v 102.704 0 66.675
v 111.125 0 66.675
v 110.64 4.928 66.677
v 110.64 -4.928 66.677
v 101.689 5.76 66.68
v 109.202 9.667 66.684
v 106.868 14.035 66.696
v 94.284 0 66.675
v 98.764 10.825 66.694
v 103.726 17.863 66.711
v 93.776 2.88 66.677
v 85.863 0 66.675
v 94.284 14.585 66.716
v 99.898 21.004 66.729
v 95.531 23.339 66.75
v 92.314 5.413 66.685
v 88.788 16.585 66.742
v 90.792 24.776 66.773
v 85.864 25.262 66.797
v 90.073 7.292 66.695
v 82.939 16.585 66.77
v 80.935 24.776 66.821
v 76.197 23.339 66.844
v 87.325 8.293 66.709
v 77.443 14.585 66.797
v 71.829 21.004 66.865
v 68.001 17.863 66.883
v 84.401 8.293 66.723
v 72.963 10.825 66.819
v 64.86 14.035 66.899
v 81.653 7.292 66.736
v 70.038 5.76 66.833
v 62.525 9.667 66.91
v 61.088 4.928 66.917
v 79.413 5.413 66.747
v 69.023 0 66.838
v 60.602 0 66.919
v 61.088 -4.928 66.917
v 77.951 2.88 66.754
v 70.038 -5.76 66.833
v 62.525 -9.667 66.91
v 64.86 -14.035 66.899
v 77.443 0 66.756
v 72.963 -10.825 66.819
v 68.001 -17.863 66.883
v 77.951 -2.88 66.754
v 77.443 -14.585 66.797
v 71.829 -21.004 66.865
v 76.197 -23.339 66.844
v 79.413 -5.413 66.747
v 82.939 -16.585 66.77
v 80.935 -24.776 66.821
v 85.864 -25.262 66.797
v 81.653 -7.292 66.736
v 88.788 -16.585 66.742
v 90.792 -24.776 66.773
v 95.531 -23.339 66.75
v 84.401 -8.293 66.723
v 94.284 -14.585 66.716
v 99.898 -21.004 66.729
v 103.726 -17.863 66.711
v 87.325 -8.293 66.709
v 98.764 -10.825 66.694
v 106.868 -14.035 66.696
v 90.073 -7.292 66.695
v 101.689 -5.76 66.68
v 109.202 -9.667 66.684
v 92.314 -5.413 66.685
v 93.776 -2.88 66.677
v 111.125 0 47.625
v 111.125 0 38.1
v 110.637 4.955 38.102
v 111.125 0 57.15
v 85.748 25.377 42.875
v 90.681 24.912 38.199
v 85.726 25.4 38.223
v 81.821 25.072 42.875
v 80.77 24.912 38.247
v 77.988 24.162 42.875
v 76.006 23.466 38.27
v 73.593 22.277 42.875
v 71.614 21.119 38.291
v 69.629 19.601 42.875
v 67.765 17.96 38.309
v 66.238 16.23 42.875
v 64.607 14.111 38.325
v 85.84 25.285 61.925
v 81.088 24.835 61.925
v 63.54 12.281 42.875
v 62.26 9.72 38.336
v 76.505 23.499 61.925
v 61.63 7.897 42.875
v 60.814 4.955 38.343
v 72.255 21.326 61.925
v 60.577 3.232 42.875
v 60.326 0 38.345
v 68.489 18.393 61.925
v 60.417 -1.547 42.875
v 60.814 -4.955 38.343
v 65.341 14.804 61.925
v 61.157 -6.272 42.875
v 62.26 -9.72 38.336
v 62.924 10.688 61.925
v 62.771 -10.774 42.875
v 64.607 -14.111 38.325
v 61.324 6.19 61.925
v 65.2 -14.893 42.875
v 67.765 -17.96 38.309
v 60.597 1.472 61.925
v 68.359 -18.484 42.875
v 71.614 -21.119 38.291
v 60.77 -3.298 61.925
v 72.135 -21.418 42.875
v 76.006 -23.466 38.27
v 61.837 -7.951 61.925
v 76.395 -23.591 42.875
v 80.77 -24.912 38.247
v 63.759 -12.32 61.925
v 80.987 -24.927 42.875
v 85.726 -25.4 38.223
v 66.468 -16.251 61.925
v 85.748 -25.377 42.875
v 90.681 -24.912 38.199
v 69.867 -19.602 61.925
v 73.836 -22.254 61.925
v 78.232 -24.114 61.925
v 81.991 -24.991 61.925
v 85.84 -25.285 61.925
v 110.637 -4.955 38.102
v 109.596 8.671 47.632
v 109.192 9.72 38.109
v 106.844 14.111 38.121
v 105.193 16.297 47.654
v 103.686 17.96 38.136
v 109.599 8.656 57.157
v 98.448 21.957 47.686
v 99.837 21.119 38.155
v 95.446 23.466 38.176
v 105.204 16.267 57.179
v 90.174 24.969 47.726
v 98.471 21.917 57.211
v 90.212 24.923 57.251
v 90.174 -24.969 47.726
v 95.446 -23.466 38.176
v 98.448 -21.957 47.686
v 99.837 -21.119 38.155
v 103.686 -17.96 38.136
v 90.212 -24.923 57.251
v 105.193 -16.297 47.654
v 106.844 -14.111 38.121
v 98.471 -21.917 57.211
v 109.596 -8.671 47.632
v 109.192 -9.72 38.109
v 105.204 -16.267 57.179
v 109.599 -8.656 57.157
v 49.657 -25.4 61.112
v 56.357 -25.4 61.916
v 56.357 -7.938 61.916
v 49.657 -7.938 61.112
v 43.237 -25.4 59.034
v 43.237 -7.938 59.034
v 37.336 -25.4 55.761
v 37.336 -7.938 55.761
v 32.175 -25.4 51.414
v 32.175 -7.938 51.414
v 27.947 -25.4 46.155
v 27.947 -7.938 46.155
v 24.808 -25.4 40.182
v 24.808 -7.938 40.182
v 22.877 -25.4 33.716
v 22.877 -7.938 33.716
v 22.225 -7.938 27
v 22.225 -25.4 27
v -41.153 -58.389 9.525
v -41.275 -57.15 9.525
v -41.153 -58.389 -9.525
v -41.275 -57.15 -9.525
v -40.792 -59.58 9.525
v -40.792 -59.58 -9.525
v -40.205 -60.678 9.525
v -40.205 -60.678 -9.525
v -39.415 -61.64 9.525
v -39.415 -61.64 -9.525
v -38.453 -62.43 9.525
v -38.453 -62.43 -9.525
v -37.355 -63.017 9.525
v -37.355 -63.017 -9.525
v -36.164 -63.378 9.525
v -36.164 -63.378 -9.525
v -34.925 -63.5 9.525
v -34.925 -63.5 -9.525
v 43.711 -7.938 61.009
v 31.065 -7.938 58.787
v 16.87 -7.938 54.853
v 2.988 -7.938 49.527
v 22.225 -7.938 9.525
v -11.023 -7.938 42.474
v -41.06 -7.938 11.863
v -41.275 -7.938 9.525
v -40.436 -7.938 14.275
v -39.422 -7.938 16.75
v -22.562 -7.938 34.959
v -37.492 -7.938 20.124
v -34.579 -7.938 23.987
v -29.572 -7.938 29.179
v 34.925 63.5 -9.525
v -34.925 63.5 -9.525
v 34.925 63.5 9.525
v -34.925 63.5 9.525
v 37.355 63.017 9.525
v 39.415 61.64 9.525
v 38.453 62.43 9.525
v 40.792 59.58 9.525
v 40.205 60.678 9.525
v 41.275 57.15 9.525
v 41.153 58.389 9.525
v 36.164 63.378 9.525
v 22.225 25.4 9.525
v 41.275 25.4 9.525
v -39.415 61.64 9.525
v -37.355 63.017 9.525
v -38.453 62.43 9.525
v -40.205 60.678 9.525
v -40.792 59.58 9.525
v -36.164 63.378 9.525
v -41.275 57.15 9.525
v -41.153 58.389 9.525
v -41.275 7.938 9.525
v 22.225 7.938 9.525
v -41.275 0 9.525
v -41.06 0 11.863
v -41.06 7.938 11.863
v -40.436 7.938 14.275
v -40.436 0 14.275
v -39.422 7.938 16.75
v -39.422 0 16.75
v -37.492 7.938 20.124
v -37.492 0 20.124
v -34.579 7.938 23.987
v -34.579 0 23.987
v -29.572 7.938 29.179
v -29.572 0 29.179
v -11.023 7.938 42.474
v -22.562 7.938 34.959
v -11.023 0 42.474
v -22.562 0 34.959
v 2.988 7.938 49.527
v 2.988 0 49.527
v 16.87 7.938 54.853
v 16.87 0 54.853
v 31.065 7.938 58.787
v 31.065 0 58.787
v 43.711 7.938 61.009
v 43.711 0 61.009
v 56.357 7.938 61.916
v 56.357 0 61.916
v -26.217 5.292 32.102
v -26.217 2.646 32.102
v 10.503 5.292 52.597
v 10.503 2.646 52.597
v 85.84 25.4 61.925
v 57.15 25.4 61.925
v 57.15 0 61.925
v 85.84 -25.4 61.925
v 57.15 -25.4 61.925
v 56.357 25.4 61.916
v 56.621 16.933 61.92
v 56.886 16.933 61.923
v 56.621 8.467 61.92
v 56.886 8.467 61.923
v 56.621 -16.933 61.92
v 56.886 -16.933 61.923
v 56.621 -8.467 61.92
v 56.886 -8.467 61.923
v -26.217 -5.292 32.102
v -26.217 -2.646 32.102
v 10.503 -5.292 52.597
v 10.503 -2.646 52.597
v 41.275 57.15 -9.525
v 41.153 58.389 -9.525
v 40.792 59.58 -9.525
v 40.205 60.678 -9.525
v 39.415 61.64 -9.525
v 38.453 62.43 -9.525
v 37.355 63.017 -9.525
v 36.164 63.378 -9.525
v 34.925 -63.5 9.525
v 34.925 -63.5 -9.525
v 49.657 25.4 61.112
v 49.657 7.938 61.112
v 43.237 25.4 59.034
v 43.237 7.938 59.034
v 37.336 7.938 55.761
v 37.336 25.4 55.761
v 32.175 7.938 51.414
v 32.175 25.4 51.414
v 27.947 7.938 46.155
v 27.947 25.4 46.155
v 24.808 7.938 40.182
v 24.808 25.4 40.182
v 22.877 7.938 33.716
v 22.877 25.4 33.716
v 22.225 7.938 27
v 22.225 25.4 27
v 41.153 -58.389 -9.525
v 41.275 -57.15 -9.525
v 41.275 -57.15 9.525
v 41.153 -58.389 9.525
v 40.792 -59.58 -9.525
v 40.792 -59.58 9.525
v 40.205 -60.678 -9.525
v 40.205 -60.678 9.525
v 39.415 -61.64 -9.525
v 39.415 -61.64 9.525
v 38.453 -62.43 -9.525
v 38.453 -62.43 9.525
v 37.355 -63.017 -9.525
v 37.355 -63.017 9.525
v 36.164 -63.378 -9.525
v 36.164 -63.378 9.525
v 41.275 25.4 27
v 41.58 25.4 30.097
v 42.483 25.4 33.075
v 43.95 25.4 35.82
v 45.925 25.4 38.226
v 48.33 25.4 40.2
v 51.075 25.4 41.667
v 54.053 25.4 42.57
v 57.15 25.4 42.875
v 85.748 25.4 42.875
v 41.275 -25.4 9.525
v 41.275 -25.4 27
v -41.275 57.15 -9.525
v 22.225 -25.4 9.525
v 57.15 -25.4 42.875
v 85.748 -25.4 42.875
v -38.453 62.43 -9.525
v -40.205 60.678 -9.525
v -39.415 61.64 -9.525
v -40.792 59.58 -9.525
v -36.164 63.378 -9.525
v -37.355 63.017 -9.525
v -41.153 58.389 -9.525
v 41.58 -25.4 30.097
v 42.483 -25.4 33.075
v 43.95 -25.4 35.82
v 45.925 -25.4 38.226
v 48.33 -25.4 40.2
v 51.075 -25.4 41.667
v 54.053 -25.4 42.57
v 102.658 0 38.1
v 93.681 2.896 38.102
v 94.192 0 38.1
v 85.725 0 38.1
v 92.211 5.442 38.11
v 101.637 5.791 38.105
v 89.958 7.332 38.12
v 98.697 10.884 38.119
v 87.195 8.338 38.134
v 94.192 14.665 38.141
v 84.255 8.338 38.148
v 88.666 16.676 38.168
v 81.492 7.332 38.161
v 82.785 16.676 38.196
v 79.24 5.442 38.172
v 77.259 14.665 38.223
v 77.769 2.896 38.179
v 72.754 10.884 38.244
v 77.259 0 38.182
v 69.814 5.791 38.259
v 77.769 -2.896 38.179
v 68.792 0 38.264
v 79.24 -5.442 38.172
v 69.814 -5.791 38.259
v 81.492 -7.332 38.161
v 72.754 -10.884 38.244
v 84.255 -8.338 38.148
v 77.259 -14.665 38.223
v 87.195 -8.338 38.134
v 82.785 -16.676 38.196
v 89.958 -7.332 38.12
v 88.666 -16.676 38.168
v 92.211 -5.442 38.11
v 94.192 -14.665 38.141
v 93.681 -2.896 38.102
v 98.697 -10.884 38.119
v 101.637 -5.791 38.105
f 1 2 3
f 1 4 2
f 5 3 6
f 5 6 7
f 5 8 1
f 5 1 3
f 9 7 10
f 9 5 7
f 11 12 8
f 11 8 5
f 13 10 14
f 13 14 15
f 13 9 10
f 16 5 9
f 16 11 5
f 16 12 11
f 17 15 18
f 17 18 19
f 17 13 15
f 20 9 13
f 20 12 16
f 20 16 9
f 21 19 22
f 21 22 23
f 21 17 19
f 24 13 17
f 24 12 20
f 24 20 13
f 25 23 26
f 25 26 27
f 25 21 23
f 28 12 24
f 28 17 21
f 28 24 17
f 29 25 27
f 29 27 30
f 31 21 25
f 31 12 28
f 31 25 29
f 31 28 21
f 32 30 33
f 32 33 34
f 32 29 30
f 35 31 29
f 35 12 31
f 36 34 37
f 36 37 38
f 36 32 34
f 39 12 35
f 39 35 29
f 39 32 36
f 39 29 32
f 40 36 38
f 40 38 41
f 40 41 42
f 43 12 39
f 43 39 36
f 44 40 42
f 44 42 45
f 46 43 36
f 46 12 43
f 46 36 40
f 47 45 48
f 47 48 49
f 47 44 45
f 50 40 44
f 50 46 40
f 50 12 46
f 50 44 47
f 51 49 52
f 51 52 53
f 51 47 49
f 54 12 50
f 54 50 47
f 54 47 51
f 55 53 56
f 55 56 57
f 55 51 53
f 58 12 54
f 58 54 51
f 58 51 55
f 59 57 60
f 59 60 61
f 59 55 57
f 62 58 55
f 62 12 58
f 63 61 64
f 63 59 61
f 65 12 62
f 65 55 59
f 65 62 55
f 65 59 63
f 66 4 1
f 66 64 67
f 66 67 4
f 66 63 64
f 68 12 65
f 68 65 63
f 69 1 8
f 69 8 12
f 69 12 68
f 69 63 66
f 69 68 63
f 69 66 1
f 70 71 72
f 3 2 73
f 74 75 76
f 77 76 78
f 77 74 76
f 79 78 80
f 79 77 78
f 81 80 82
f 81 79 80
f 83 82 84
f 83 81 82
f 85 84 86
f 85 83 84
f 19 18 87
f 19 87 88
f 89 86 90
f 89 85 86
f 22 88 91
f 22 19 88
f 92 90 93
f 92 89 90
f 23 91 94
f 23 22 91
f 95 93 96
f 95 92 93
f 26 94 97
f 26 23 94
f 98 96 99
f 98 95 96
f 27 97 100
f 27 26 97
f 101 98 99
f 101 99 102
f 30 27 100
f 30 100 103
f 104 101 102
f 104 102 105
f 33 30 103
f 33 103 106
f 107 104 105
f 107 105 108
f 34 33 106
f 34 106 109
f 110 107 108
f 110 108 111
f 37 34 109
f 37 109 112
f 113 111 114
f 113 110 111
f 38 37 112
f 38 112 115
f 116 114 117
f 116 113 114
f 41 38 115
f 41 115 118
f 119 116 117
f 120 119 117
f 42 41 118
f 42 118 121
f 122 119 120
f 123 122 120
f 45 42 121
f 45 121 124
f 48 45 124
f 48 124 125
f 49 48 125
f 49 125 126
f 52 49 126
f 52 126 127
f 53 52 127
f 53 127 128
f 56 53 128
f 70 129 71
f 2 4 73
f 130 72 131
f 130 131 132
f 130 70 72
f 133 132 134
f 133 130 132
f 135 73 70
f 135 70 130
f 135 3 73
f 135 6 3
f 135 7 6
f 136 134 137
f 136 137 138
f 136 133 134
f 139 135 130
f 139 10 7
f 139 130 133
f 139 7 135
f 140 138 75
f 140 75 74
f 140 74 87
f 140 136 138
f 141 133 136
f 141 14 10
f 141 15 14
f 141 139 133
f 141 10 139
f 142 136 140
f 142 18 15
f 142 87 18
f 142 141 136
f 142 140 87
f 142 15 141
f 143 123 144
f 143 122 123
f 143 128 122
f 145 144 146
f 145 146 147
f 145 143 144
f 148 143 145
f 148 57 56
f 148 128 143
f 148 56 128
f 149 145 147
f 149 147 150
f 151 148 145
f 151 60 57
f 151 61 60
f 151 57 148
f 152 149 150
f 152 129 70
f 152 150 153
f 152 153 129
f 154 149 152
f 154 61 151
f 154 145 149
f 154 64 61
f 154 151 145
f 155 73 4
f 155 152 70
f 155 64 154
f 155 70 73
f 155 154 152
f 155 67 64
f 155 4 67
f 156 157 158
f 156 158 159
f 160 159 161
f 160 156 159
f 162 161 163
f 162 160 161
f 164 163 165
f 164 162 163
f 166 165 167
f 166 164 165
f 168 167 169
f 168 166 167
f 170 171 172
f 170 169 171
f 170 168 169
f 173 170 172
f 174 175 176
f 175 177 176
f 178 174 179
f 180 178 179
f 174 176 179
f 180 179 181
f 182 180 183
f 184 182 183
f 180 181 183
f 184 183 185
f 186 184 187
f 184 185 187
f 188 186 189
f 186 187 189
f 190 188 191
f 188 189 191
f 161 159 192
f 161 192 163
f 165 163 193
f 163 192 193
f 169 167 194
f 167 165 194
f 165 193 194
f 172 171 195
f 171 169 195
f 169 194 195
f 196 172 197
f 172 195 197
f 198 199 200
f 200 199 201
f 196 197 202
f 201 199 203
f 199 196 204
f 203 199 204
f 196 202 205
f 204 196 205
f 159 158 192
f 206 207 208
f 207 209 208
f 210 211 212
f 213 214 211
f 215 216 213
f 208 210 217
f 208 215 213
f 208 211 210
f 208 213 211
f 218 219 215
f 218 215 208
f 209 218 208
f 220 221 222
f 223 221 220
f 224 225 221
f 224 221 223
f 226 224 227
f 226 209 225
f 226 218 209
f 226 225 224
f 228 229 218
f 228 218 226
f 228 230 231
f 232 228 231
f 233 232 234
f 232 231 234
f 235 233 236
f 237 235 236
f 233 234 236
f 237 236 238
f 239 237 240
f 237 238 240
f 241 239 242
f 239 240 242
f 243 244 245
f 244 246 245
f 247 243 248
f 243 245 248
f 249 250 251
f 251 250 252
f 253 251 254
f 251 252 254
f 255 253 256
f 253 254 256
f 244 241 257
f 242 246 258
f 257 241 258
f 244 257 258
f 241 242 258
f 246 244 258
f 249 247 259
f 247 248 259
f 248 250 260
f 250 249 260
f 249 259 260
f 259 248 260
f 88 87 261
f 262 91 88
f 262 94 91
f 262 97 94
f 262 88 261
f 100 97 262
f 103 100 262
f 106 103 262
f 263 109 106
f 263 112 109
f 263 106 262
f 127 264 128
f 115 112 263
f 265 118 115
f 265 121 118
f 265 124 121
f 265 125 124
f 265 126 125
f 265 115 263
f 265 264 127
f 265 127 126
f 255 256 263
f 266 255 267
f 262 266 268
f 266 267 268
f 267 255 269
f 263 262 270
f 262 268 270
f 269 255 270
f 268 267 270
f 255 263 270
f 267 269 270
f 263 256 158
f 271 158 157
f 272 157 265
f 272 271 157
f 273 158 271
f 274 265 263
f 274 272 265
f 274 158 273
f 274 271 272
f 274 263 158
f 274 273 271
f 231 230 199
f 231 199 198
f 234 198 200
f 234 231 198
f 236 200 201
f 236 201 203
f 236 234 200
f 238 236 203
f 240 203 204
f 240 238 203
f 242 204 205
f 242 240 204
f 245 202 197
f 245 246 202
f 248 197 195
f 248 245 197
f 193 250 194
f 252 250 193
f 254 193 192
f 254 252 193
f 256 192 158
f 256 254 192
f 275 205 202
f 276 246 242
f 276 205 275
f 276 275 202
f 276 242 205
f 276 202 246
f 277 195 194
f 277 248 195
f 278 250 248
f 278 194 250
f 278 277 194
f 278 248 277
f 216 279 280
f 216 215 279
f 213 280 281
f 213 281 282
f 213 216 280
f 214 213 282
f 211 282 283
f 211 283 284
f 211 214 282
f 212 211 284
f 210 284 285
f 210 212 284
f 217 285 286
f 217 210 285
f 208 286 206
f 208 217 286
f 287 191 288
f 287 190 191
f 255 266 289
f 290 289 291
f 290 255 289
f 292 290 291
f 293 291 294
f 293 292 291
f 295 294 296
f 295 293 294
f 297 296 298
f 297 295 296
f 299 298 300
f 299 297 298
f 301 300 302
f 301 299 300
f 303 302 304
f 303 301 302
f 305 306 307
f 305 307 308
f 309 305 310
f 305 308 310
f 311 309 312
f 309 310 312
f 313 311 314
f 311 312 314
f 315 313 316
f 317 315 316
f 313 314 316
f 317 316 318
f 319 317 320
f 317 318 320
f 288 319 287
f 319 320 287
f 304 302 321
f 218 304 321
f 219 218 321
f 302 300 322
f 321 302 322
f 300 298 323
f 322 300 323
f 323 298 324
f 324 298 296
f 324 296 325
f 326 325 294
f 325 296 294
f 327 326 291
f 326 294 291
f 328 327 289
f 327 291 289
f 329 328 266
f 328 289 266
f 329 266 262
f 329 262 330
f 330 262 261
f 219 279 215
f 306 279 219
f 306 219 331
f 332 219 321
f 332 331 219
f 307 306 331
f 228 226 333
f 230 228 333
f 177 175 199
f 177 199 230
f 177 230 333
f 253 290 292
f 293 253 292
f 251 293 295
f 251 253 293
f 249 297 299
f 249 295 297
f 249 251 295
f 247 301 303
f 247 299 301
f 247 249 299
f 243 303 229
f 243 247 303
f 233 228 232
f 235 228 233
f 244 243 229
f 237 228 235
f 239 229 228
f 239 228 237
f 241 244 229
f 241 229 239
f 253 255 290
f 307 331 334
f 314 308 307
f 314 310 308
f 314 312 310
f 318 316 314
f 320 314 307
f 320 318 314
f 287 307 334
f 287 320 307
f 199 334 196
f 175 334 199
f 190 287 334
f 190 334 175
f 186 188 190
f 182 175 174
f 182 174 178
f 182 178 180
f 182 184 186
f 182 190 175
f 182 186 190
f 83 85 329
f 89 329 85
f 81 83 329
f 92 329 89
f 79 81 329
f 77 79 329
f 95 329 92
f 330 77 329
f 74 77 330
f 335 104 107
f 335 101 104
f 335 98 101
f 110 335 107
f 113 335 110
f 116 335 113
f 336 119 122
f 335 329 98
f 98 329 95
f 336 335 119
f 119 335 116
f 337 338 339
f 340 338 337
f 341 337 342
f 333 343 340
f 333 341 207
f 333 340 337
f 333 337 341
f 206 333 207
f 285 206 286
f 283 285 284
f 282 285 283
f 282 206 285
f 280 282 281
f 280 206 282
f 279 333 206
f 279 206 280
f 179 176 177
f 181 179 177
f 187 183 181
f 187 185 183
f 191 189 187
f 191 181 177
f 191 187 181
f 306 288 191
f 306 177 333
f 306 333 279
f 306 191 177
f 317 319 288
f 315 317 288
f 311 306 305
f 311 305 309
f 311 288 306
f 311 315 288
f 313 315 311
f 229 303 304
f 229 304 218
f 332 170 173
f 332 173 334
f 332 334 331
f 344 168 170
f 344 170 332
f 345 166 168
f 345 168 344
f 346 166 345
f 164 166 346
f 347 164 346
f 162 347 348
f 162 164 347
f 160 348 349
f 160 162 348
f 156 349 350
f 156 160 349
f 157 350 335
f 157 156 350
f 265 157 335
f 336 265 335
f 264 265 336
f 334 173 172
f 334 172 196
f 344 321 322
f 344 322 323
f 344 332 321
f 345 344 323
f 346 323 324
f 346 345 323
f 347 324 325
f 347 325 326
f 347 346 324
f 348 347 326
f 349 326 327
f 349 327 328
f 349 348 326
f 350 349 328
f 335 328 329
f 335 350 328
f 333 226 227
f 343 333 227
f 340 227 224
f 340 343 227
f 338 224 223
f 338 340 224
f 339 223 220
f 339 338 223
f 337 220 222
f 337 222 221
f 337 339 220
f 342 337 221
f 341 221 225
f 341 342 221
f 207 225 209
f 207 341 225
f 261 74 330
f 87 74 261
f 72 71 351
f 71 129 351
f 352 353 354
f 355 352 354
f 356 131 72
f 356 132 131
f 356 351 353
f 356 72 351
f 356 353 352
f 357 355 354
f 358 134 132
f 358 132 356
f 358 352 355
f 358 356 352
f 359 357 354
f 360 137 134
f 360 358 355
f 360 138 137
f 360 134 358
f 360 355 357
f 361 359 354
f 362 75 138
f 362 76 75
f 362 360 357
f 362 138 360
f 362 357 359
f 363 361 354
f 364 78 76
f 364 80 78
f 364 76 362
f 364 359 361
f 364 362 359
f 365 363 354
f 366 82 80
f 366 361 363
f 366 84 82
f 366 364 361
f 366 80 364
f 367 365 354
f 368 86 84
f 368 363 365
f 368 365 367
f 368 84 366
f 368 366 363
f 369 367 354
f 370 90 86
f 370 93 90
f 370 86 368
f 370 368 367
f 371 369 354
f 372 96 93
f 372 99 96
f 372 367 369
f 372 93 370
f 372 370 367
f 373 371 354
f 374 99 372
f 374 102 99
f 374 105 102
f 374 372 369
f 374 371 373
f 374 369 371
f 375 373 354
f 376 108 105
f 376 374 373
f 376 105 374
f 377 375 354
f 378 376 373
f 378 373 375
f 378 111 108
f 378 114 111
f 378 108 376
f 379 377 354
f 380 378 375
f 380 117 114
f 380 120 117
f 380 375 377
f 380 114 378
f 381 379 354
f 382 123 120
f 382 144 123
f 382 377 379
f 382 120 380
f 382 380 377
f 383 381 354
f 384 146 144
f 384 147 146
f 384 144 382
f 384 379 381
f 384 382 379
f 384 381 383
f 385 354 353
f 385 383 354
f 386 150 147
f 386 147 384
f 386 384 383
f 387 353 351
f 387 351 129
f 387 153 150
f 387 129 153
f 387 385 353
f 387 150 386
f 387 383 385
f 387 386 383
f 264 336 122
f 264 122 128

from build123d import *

# Parameters (mm, degrees)
F1_DEPTH = 63.5
F2_DEPTH = 25.4
F3_DEPTH = 7.9375
F5_R     = 6.35


with BuildPart() as f1:
    # F0 (on Front) → F1 (new body, symmetric)
    with BuildSketch(Plane.XZ):
        Polygon((-41.275, -9.525), (41.275, -9.525), (41.275, 9.525), (22.225, 9.525), (-41.275, 9.525), align=None)
    extrude(amount=F1_DEPTH, both=True)

    # F0 (on Front) → F2 (join, symmetric)
    with BuildSketch(Plane.XZ):
        Polygon((60.325, 61.9252), (60.325, 42.8752), (85.7480703479, 42.8752), (85.8401063105, 61.9252), align=None)
        with BuildLine():
            Line((22.225, 9.525), (41.275, 9.525))
            Line((41.275, 9.525), (41.275, 27.0002))
            ThreePointArc((41.275, 27.0002), (45.9246798487, 38.2255201513), (57.15, 42.8752))
            Line((57.15, 42.8752), (60.325, 42.8752))
            Line((60.325, 42.8752), (60.325, 61.9252))
            Line((60.325, 61.9252), (57.15, 61.9252))
            add(Edge.make_bspline(
                [(56.356848483, 61.9161925488), (56.6214024157, 61.9201926701), (56.8857897727, 61.9231977078), (57.15, 61.9252)],
                knots=[110.870288539, 110.870288539, 110.870288539, 110.870288539, 111.5045361635, 111.5045361635, 111.5045361635, 111.5045361635], degree=3))
            ThreePointArc((56.356848483, 61.9161925488), (32.1754485352, 51.4138724835), (22.225, 27.0002))
            Line((22.225, 27.0002), (22.225, 9.525))
        make_face()
    extrude(amount=F2_DEPTH, both=True)

    # F0 (on Front) → F3 (join, symmetric)
    with BuildSketch(Plane.XZ):
        with BuildLine():
            add(Edge.make_bspline(
                [(-41.275, 9.525), (-41.2244558949, 30.1107989648), (10.1112344326, 61.2169473646), (56.356848483, 61.9161925488)],
                knots=[0, 0, 0, 0, 110.870288539, 110.870288539, 110.870288539, 110.870288539], degree=3))
            Line((-41.275, 9.525), (22.225, 9.525))
            Line((22.225, 9.525), (22.225, 27.0002))
            ThreePointArc((22.225, 27.0002), (32.1754485352, 51.4138724835), (56.356848483, 61.9161925488))
        make_face()
    extrude(amount=F3_DEPTH, both=True)

    # F0 (on Front) → F4 (revolve)
    with BuildSketch(Plane.XZ):
        Polygon((85.8401063105, 61.9252), (85.7480703479, 42.8752), (85.725, 38.1), (111.125, 38.1), (111.125, 66.675), (85.8630539438, 66.675), align=None)
    revolve(axis=Axis((85.7940269719, 0, 52.3875), (0.0048312277, 0, 0.9999883296)))

    # F5
    f5_edges = [f1.edges().sort_by_distance(p)[0] for p in [
        (41.275, -63.5, 0),
        (-41.275, -63.5, 0),
        (41.275, 63.5, 0),
        (-41.275, 63.5, 0),
    ]]
    fillet(f5_edges, radius=F5_R)


solid = f1.part
